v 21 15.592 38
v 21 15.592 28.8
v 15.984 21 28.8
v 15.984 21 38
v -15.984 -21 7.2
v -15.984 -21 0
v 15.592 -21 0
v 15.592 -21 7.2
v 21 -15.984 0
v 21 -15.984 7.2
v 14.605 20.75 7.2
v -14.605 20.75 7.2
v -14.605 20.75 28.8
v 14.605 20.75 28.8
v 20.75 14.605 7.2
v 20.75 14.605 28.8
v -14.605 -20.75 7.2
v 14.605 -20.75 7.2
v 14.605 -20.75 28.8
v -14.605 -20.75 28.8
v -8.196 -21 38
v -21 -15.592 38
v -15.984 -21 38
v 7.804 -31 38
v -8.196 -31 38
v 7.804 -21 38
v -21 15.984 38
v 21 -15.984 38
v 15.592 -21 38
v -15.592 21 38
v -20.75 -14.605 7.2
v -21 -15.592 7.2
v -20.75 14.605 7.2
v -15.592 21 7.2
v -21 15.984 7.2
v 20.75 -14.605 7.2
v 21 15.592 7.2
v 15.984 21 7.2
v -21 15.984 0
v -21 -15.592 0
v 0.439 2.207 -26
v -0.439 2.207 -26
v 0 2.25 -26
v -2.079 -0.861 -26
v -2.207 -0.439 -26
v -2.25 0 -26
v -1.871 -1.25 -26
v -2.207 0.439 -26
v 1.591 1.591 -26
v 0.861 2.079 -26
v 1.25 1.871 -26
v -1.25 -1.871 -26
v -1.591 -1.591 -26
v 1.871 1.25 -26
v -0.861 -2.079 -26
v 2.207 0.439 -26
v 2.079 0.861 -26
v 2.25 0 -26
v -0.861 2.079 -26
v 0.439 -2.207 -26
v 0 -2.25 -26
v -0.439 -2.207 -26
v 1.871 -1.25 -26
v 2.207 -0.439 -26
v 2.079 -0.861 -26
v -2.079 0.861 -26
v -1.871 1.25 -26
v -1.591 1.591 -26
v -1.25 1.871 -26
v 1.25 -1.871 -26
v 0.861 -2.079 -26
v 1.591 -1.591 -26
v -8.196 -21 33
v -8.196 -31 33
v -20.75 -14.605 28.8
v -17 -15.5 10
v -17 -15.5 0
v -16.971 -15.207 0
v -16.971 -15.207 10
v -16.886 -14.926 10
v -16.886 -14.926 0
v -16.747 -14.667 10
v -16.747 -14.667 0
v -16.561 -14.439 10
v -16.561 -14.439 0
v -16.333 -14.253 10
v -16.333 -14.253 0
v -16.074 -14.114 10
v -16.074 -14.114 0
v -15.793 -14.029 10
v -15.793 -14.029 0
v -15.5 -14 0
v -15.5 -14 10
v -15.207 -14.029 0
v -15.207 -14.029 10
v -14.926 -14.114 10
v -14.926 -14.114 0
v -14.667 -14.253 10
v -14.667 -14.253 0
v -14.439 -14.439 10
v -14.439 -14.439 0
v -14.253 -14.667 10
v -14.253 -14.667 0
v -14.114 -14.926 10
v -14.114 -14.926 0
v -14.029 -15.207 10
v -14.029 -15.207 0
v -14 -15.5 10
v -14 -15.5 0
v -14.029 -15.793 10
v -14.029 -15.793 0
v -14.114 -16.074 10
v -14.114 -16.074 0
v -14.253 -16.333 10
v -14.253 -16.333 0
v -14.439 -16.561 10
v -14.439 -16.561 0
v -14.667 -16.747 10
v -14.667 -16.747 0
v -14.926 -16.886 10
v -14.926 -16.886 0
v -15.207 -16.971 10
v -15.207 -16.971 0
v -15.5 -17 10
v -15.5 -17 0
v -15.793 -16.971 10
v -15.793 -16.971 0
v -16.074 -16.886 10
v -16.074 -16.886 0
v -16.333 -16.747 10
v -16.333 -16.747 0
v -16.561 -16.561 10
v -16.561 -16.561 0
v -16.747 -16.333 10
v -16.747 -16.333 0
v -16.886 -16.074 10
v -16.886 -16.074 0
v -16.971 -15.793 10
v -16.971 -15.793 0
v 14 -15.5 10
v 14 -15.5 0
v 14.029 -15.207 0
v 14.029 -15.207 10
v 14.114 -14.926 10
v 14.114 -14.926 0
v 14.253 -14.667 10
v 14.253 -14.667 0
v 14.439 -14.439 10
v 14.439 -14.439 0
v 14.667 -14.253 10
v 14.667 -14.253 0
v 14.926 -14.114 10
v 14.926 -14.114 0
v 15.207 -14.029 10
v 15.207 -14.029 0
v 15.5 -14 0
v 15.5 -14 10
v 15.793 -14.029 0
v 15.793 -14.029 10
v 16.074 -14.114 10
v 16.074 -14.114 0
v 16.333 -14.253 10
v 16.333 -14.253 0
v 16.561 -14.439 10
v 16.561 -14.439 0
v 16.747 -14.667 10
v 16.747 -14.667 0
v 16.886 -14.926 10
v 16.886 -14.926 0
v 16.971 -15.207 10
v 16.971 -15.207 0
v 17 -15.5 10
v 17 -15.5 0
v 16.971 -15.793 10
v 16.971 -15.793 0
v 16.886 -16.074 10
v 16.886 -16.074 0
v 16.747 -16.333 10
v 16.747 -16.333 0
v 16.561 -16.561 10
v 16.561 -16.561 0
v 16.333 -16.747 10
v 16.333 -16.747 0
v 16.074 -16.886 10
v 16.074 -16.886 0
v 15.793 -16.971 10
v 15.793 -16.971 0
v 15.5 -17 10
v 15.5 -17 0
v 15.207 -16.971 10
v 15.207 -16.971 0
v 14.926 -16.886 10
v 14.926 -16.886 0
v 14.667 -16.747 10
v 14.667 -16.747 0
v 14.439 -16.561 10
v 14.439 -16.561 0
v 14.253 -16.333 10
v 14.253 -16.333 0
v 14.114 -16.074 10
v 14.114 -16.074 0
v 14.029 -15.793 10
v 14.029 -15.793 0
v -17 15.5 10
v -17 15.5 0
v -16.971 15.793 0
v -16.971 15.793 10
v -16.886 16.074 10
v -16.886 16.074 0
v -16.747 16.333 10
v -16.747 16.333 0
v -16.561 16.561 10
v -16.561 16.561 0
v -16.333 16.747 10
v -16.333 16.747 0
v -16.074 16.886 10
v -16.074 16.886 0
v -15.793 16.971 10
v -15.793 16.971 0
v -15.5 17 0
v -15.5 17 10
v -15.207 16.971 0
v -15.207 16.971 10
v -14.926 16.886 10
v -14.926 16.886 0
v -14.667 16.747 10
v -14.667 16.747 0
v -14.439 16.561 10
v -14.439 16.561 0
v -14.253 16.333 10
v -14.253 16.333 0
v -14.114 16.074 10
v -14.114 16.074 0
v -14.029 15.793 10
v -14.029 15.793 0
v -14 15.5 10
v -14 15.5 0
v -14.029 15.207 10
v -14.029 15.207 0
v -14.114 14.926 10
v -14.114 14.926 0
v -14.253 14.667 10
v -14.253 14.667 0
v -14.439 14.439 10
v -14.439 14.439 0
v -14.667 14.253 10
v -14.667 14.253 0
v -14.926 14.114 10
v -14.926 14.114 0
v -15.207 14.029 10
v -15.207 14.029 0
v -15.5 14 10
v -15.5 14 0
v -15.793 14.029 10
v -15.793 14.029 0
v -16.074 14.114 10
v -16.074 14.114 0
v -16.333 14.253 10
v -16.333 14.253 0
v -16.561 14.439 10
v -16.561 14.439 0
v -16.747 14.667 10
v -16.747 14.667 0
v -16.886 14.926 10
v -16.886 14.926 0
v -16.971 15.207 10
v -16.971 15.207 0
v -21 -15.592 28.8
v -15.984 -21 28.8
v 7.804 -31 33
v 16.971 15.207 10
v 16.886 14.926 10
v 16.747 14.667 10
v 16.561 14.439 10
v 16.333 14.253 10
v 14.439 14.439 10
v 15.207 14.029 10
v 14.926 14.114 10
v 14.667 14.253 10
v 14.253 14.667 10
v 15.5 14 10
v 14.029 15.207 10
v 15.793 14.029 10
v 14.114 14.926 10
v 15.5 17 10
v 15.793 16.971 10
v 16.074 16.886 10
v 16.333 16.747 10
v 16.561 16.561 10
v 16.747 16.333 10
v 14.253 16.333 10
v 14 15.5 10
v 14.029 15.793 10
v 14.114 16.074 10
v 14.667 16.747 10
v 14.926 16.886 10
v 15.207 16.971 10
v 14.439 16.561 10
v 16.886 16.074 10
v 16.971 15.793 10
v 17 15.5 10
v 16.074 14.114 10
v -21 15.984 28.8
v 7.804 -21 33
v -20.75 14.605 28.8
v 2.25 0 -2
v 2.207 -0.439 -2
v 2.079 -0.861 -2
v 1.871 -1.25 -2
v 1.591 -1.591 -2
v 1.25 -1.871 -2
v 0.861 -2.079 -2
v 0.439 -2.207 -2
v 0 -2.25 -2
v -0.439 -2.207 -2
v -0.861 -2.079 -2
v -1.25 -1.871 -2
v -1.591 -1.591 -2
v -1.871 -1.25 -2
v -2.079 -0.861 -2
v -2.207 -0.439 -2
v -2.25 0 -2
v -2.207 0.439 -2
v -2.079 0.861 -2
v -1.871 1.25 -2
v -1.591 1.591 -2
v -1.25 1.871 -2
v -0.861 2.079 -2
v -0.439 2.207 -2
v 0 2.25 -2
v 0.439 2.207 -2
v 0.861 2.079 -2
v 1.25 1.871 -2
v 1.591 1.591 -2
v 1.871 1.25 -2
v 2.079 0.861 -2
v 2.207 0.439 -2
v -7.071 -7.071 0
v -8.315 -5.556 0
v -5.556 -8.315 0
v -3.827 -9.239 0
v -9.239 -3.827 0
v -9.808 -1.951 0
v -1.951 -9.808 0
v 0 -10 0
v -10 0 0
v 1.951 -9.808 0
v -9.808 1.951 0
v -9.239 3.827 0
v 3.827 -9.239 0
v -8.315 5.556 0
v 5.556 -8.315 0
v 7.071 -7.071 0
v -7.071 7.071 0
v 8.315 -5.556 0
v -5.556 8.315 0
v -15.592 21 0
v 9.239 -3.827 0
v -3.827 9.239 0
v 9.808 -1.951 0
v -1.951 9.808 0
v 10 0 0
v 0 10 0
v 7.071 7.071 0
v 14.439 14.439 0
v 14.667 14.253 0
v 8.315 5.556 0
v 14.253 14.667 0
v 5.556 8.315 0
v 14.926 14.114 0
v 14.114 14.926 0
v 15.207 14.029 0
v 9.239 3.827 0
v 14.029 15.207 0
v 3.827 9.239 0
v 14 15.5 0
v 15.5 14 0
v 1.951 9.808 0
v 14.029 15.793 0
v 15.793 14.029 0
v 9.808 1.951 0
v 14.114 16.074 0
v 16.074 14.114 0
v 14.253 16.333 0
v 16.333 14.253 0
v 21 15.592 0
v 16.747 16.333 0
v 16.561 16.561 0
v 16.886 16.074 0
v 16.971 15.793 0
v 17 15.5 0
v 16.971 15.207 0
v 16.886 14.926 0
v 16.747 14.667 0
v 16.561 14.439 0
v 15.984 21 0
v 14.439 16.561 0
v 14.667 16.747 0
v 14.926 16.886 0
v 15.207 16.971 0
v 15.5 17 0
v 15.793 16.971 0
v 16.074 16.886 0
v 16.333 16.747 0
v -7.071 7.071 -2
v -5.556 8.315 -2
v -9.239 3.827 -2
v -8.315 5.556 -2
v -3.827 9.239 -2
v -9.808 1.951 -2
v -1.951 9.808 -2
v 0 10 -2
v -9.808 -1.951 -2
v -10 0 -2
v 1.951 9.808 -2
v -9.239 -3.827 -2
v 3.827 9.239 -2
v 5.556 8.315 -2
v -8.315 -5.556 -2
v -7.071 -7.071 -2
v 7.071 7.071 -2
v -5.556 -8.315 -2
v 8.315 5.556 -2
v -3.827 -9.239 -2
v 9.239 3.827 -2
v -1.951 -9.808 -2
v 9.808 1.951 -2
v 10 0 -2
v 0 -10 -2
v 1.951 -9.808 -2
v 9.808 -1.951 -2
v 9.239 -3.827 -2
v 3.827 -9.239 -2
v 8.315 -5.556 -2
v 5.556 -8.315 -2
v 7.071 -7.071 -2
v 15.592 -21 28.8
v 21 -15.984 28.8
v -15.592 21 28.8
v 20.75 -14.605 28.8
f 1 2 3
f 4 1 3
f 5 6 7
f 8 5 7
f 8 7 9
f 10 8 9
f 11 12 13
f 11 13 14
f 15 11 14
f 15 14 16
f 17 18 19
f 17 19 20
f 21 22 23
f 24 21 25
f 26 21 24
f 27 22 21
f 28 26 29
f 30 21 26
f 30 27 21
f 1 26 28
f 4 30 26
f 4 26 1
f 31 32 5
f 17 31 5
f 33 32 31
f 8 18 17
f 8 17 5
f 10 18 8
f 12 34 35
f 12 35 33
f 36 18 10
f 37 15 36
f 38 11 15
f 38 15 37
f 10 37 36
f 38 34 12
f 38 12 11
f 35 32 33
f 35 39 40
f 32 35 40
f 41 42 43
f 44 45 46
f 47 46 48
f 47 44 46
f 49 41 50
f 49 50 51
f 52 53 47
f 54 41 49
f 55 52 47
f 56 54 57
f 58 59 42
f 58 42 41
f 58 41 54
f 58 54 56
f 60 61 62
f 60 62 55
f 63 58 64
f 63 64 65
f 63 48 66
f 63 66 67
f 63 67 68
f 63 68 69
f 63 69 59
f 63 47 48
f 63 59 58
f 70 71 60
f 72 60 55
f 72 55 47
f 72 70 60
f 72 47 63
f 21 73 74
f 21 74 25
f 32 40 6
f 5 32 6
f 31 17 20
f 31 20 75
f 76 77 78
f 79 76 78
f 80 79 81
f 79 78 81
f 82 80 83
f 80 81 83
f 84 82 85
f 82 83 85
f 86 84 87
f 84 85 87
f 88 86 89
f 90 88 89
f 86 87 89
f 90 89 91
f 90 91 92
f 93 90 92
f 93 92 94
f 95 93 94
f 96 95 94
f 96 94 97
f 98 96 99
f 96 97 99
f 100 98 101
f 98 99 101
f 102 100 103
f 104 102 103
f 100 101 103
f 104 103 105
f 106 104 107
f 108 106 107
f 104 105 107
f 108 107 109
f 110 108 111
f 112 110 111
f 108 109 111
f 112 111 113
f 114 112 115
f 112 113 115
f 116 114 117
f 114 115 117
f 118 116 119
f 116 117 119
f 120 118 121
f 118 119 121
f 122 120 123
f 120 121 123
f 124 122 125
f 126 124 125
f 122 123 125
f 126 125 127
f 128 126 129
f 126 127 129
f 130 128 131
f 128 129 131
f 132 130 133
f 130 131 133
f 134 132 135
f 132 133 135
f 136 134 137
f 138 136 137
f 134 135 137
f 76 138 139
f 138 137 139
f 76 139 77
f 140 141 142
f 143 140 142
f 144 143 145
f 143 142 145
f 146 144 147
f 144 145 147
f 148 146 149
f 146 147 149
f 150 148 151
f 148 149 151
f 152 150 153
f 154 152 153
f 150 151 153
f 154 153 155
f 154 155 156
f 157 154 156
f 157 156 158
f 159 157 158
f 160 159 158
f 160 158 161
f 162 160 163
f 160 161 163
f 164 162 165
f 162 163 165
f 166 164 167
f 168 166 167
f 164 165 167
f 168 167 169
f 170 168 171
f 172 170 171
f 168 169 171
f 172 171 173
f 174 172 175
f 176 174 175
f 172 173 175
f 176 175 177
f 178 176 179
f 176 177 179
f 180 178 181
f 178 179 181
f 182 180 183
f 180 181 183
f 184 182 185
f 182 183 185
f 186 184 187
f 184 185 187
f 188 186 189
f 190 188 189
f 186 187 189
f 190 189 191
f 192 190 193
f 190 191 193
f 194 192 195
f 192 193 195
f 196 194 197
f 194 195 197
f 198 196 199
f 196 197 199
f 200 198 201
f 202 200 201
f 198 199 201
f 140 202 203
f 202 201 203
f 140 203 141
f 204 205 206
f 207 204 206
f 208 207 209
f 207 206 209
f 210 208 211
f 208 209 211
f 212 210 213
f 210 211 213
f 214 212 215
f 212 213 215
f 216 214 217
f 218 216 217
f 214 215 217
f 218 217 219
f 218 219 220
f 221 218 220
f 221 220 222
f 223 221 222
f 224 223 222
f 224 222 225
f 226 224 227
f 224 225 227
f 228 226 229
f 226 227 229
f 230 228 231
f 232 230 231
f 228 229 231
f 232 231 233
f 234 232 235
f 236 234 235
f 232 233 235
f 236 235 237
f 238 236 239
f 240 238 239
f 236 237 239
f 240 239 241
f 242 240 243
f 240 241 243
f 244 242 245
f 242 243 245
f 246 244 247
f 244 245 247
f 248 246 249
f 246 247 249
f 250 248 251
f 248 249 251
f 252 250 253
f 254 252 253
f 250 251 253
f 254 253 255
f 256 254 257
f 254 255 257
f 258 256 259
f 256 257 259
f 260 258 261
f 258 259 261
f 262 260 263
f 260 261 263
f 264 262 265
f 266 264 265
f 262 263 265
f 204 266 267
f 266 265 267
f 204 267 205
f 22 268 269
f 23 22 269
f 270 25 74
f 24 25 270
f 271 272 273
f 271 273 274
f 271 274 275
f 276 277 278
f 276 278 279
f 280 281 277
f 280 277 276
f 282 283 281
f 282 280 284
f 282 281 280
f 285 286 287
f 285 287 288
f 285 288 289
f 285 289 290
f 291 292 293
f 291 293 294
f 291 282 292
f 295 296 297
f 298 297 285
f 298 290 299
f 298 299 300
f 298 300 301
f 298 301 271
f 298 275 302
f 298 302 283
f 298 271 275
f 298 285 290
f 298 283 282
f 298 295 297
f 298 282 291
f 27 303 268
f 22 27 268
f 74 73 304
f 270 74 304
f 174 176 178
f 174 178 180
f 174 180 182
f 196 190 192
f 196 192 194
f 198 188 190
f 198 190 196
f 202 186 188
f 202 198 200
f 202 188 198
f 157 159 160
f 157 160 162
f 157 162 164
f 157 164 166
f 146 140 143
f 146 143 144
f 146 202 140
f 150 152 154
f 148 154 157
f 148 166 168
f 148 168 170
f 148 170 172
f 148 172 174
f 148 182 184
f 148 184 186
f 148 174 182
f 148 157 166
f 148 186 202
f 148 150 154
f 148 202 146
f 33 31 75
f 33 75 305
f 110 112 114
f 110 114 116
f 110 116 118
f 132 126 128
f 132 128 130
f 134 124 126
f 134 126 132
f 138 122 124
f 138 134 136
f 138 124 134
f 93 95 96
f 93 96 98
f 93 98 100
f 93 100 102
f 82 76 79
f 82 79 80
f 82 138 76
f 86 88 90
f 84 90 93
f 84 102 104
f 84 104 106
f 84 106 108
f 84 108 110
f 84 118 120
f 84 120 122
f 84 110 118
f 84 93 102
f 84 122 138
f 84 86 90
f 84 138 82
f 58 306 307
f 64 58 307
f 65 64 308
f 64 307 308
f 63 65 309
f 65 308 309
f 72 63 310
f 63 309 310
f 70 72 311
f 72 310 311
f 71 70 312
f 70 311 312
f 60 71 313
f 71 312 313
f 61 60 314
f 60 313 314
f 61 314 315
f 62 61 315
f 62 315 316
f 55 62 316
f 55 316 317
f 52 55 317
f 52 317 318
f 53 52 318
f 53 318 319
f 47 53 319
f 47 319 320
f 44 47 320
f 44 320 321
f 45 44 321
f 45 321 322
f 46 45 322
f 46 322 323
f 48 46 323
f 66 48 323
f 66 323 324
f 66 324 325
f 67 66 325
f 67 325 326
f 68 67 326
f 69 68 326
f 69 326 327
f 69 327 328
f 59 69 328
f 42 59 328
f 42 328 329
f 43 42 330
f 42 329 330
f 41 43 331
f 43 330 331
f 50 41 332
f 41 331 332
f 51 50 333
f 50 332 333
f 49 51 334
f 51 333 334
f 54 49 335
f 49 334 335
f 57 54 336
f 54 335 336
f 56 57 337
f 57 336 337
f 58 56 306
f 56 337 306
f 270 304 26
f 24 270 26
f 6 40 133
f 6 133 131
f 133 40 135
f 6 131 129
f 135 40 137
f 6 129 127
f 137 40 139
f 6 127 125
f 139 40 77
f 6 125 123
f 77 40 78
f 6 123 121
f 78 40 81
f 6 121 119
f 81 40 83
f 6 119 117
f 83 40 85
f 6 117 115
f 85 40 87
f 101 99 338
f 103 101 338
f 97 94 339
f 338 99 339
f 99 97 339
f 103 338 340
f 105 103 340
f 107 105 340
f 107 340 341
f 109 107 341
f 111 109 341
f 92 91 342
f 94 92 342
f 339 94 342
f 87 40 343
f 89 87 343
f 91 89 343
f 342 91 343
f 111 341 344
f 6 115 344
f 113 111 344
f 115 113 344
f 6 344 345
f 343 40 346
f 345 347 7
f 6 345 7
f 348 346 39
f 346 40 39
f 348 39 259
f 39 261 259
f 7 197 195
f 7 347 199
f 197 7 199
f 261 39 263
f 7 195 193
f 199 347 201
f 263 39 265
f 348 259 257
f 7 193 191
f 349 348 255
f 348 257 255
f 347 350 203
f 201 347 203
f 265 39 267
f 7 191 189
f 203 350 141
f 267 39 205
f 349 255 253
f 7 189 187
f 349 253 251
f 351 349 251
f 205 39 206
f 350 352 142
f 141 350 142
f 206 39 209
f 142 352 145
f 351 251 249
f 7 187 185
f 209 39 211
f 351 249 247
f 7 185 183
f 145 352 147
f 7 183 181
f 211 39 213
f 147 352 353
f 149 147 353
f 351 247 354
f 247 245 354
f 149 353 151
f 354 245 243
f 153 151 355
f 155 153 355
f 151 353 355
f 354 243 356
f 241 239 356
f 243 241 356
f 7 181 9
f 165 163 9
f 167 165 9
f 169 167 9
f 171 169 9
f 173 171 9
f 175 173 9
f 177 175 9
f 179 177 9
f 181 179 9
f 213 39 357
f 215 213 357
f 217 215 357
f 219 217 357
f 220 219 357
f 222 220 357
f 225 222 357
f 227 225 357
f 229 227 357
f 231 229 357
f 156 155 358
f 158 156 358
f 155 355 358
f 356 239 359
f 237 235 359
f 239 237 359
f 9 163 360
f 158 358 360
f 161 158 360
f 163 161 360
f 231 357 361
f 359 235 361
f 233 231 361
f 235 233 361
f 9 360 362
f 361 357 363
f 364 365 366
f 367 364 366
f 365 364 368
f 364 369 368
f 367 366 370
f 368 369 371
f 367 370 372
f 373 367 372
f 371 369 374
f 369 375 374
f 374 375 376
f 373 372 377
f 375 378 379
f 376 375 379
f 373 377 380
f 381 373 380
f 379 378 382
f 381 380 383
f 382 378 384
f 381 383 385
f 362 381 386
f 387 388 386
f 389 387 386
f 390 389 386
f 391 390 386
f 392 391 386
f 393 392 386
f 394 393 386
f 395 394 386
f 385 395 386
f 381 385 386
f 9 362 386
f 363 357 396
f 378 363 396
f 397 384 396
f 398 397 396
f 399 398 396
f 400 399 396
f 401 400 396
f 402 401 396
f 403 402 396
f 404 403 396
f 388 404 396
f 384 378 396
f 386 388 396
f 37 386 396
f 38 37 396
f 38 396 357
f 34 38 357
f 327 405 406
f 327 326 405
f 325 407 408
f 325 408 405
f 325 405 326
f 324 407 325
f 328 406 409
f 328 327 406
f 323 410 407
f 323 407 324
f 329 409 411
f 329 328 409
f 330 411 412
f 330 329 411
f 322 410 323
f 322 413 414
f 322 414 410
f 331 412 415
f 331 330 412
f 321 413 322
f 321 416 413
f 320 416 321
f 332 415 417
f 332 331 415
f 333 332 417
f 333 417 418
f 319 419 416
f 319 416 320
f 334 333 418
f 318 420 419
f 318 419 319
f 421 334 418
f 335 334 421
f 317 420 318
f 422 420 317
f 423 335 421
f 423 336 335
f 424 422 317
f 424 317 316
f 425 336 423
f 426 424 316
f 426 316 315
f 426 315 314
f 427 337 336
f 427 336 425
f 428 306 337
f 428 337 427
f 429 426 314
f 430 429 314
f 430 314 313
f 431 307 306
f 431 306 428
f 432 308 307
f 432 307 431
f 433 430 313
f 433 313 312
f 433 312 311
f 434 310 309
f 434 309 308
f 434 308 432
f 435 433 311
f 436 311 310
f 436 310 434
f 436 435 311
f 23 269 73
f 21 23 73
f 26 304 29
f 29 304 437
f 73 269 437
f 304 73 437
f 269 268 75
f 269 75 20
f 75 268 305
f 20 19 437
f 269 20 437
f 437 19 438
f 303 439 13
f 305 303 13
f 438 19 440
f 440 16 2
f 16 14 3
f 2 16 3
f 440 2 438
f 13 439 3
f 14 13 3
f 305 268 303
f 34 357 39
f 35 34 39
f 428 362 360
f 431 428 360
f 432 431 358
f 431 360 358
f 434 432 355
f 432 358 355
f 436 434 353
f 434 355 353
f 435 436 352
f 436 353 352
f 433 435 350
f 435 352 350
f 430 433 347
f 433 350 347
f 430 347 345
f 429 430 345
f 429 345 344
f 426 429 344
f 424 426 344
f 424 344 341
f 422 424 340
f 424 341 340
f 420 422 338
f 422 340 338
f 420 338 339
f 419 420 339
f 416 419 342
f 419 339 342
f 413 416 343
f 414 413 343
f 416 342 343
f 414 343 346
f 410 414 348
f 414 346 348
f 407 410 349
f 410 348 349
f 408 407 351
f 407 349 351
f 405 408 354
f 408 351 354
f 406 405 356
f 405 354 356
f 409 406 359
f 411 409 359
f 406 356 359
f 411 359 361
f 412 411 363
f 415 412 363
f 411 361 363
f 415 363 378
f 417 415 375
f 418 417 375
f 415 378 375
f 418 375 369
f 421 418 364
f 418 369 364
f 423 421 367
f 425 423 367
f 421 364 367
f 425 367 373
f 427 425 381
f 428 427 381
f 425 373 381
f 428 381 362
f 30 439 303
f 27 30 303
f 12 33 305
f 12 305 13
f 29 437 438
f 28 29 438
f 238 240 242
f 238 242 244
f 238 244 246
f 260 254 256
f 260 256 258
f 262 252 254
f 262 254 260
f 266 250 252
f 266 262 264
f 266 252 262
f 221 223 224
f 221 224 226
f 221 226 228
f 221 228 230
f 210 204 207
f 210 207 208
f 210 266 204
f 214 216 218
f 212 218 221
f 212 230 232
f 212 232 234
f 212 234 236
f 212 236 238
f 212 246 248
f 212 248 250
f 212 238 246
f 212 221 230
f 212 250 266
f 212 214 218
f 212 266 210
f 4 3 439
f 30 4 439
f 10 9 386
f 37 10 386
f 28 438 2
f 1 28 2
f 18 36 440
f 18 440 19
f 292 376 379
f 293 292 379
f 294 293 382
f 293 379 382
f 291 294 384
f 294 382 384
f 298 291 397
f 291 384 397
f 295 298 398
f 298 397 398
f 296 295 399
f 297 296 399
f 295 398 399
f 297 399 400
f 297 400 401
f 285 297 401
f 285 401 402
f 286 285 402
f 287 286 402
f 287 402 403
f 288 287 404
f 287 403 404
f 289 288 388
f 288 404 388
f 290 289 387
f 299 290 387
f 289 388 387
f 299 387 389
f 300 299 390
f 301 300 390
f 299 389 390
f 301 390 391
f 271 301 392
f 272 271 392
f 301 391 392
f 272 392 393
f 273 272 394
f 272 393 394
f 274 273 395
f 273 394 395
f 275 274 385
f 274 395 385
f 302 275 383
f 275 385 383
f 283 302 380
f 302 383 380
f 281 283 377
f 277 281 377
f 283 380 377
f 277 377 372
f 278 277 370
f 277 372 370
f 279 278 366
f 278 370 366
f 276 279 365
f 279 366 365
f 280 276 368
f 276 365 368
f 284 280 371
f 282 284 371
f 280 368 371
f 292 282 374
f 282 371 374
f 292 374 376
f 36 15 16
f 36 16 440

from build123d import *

# Parameters (mm, degrees)
RESSALTO_EXTRUS_O1_DEPTH   = 38
CORTE_EXTRUS_O_FINA1_START = -30.8
CORTE_EXTRUS_O_FINA1_DEPTH = 21.6
ESBO_O3_R                  = 2.25
RESSALTO_EXTRUS_O2_DEPTH   = 26
ESBO_O4_R                  = 10
RESSALTO_EXTRUS_O3_DEPTH   = 2
ESBO_O5_R                  = 1.5
CORTE_EXTRUS_O1_DEPTH      = 10
ESBO_O7_W                  = 16
ESBO_O7_H                  = 5
RESSALTO_EXTRUS_O4_DEPTH   = 10


# Read off the part's stored shape, not the designer's step: Corte-Extrusão-Fina1
with BuildPart() as part:
    # Esboço1 → Ressalto-extrusão1 (new body)
    with BuildSketch(Plane.XY):
        Polygon((-21, -15.592171873), (-15.984175996, -21), (15.592171873, -21), (21, -15.984175996), (21, 15.592171873), (15.984175996, 21), (-15.592171873, 21), (-21, 15.984175996), align=None)
    extrude(amount=RESSALTO_EXTRUS_O1_DEPTH)

    # Corte-Extrusão-Fina1 outline → Corte-Extrusão-Fina1 (cut)
    with BuildSketch(Plane.XY.offset(38).offset(CORTE_EXTRUS_O_FINA1_START)):
        Polygon((15.592171873, -21), (21, -15.984175996), (21, 15.592171873), (15.984175996, 21), (-15.592171873, 21), (-21, 15.984175996), (-21, -15.592171873), (-15.984175996, -21), align=None)
        Polygon((14.605339059, 20.75), (20.75, 14.605339059), (20.75, -14.605339059), (14.605339059, -20.75), (-14.605339059, -20.75), (-20.75, -14.605339059), (-20.75, 14.605339059), (-14.605339059, 20.75), align=None, mode=Mode.SUBTRACT)
    extrude(amount=CORTE_EXTRUS_O_FINA1_DEPTH, mode=Mode.SUBTRACT)

    # Esboço3 → Ressalto-extrusão2 (add)
    with BuildSketch(Plane(origin=(0, 0, 0), x_dir=(-1, 0, 0), z_dir=(0, 0, -1))):
        with Locations(Location((0, 0, 0), (0, 0, 180))):
            Circle(ESBO_O3_R)
    extrude(amount=RESSALTO_EXTRUS_O2_DEPTH)

    # Esboço4 → Ressalto-extrusão3 (add)
    with BuildSketch(Plane(origin=(0, 0, 0), x_dir=(-1, 0, 0), z_dir=(0, 0, -1))):
        with Locations(Location((0, 0, 0), (0, 0, 180))):
            Circle(ESBO_O4_R)
    extrude(amount=RESSALTO_EXTRUS_O3_DEPTH)

    # Esboço5 → Corte-extrusão1 (cut)
    with BuildSketch(Plane(origin=(0, 0, 0), x_dir=(-1, 0, 0), z_dir=(0, 0, -1))):
        with Locations((15.5, -15.5)):
            Circle(ESBO_O5_R)
        with Locations((-15.5, -15.5)):
            Circle(ESBO_O5_R)
        with Locations((-15.5, 15.5)):
            Circle(ESBO_O5_R)
        with Locations((15.5, 15.5)):
            Circle(ESBO_O5_R)
    extrude(amount=-CORTE_EXTRUS_O1_DEPTH, mode=Mode.SUBTRACT)

    # Esboço7 → Ressalto-extrusão4 (add)
    with BuildSketch(Plane.XZ.offset(21)):
        with Locations((-0.196002062, 35.5)):
            Rectangle(ESBO_O7_W, ESBO_O7_H)
    extrude(amount=RESSALTO_EXTRUS_O4_DEPTH)


solid = part.part
